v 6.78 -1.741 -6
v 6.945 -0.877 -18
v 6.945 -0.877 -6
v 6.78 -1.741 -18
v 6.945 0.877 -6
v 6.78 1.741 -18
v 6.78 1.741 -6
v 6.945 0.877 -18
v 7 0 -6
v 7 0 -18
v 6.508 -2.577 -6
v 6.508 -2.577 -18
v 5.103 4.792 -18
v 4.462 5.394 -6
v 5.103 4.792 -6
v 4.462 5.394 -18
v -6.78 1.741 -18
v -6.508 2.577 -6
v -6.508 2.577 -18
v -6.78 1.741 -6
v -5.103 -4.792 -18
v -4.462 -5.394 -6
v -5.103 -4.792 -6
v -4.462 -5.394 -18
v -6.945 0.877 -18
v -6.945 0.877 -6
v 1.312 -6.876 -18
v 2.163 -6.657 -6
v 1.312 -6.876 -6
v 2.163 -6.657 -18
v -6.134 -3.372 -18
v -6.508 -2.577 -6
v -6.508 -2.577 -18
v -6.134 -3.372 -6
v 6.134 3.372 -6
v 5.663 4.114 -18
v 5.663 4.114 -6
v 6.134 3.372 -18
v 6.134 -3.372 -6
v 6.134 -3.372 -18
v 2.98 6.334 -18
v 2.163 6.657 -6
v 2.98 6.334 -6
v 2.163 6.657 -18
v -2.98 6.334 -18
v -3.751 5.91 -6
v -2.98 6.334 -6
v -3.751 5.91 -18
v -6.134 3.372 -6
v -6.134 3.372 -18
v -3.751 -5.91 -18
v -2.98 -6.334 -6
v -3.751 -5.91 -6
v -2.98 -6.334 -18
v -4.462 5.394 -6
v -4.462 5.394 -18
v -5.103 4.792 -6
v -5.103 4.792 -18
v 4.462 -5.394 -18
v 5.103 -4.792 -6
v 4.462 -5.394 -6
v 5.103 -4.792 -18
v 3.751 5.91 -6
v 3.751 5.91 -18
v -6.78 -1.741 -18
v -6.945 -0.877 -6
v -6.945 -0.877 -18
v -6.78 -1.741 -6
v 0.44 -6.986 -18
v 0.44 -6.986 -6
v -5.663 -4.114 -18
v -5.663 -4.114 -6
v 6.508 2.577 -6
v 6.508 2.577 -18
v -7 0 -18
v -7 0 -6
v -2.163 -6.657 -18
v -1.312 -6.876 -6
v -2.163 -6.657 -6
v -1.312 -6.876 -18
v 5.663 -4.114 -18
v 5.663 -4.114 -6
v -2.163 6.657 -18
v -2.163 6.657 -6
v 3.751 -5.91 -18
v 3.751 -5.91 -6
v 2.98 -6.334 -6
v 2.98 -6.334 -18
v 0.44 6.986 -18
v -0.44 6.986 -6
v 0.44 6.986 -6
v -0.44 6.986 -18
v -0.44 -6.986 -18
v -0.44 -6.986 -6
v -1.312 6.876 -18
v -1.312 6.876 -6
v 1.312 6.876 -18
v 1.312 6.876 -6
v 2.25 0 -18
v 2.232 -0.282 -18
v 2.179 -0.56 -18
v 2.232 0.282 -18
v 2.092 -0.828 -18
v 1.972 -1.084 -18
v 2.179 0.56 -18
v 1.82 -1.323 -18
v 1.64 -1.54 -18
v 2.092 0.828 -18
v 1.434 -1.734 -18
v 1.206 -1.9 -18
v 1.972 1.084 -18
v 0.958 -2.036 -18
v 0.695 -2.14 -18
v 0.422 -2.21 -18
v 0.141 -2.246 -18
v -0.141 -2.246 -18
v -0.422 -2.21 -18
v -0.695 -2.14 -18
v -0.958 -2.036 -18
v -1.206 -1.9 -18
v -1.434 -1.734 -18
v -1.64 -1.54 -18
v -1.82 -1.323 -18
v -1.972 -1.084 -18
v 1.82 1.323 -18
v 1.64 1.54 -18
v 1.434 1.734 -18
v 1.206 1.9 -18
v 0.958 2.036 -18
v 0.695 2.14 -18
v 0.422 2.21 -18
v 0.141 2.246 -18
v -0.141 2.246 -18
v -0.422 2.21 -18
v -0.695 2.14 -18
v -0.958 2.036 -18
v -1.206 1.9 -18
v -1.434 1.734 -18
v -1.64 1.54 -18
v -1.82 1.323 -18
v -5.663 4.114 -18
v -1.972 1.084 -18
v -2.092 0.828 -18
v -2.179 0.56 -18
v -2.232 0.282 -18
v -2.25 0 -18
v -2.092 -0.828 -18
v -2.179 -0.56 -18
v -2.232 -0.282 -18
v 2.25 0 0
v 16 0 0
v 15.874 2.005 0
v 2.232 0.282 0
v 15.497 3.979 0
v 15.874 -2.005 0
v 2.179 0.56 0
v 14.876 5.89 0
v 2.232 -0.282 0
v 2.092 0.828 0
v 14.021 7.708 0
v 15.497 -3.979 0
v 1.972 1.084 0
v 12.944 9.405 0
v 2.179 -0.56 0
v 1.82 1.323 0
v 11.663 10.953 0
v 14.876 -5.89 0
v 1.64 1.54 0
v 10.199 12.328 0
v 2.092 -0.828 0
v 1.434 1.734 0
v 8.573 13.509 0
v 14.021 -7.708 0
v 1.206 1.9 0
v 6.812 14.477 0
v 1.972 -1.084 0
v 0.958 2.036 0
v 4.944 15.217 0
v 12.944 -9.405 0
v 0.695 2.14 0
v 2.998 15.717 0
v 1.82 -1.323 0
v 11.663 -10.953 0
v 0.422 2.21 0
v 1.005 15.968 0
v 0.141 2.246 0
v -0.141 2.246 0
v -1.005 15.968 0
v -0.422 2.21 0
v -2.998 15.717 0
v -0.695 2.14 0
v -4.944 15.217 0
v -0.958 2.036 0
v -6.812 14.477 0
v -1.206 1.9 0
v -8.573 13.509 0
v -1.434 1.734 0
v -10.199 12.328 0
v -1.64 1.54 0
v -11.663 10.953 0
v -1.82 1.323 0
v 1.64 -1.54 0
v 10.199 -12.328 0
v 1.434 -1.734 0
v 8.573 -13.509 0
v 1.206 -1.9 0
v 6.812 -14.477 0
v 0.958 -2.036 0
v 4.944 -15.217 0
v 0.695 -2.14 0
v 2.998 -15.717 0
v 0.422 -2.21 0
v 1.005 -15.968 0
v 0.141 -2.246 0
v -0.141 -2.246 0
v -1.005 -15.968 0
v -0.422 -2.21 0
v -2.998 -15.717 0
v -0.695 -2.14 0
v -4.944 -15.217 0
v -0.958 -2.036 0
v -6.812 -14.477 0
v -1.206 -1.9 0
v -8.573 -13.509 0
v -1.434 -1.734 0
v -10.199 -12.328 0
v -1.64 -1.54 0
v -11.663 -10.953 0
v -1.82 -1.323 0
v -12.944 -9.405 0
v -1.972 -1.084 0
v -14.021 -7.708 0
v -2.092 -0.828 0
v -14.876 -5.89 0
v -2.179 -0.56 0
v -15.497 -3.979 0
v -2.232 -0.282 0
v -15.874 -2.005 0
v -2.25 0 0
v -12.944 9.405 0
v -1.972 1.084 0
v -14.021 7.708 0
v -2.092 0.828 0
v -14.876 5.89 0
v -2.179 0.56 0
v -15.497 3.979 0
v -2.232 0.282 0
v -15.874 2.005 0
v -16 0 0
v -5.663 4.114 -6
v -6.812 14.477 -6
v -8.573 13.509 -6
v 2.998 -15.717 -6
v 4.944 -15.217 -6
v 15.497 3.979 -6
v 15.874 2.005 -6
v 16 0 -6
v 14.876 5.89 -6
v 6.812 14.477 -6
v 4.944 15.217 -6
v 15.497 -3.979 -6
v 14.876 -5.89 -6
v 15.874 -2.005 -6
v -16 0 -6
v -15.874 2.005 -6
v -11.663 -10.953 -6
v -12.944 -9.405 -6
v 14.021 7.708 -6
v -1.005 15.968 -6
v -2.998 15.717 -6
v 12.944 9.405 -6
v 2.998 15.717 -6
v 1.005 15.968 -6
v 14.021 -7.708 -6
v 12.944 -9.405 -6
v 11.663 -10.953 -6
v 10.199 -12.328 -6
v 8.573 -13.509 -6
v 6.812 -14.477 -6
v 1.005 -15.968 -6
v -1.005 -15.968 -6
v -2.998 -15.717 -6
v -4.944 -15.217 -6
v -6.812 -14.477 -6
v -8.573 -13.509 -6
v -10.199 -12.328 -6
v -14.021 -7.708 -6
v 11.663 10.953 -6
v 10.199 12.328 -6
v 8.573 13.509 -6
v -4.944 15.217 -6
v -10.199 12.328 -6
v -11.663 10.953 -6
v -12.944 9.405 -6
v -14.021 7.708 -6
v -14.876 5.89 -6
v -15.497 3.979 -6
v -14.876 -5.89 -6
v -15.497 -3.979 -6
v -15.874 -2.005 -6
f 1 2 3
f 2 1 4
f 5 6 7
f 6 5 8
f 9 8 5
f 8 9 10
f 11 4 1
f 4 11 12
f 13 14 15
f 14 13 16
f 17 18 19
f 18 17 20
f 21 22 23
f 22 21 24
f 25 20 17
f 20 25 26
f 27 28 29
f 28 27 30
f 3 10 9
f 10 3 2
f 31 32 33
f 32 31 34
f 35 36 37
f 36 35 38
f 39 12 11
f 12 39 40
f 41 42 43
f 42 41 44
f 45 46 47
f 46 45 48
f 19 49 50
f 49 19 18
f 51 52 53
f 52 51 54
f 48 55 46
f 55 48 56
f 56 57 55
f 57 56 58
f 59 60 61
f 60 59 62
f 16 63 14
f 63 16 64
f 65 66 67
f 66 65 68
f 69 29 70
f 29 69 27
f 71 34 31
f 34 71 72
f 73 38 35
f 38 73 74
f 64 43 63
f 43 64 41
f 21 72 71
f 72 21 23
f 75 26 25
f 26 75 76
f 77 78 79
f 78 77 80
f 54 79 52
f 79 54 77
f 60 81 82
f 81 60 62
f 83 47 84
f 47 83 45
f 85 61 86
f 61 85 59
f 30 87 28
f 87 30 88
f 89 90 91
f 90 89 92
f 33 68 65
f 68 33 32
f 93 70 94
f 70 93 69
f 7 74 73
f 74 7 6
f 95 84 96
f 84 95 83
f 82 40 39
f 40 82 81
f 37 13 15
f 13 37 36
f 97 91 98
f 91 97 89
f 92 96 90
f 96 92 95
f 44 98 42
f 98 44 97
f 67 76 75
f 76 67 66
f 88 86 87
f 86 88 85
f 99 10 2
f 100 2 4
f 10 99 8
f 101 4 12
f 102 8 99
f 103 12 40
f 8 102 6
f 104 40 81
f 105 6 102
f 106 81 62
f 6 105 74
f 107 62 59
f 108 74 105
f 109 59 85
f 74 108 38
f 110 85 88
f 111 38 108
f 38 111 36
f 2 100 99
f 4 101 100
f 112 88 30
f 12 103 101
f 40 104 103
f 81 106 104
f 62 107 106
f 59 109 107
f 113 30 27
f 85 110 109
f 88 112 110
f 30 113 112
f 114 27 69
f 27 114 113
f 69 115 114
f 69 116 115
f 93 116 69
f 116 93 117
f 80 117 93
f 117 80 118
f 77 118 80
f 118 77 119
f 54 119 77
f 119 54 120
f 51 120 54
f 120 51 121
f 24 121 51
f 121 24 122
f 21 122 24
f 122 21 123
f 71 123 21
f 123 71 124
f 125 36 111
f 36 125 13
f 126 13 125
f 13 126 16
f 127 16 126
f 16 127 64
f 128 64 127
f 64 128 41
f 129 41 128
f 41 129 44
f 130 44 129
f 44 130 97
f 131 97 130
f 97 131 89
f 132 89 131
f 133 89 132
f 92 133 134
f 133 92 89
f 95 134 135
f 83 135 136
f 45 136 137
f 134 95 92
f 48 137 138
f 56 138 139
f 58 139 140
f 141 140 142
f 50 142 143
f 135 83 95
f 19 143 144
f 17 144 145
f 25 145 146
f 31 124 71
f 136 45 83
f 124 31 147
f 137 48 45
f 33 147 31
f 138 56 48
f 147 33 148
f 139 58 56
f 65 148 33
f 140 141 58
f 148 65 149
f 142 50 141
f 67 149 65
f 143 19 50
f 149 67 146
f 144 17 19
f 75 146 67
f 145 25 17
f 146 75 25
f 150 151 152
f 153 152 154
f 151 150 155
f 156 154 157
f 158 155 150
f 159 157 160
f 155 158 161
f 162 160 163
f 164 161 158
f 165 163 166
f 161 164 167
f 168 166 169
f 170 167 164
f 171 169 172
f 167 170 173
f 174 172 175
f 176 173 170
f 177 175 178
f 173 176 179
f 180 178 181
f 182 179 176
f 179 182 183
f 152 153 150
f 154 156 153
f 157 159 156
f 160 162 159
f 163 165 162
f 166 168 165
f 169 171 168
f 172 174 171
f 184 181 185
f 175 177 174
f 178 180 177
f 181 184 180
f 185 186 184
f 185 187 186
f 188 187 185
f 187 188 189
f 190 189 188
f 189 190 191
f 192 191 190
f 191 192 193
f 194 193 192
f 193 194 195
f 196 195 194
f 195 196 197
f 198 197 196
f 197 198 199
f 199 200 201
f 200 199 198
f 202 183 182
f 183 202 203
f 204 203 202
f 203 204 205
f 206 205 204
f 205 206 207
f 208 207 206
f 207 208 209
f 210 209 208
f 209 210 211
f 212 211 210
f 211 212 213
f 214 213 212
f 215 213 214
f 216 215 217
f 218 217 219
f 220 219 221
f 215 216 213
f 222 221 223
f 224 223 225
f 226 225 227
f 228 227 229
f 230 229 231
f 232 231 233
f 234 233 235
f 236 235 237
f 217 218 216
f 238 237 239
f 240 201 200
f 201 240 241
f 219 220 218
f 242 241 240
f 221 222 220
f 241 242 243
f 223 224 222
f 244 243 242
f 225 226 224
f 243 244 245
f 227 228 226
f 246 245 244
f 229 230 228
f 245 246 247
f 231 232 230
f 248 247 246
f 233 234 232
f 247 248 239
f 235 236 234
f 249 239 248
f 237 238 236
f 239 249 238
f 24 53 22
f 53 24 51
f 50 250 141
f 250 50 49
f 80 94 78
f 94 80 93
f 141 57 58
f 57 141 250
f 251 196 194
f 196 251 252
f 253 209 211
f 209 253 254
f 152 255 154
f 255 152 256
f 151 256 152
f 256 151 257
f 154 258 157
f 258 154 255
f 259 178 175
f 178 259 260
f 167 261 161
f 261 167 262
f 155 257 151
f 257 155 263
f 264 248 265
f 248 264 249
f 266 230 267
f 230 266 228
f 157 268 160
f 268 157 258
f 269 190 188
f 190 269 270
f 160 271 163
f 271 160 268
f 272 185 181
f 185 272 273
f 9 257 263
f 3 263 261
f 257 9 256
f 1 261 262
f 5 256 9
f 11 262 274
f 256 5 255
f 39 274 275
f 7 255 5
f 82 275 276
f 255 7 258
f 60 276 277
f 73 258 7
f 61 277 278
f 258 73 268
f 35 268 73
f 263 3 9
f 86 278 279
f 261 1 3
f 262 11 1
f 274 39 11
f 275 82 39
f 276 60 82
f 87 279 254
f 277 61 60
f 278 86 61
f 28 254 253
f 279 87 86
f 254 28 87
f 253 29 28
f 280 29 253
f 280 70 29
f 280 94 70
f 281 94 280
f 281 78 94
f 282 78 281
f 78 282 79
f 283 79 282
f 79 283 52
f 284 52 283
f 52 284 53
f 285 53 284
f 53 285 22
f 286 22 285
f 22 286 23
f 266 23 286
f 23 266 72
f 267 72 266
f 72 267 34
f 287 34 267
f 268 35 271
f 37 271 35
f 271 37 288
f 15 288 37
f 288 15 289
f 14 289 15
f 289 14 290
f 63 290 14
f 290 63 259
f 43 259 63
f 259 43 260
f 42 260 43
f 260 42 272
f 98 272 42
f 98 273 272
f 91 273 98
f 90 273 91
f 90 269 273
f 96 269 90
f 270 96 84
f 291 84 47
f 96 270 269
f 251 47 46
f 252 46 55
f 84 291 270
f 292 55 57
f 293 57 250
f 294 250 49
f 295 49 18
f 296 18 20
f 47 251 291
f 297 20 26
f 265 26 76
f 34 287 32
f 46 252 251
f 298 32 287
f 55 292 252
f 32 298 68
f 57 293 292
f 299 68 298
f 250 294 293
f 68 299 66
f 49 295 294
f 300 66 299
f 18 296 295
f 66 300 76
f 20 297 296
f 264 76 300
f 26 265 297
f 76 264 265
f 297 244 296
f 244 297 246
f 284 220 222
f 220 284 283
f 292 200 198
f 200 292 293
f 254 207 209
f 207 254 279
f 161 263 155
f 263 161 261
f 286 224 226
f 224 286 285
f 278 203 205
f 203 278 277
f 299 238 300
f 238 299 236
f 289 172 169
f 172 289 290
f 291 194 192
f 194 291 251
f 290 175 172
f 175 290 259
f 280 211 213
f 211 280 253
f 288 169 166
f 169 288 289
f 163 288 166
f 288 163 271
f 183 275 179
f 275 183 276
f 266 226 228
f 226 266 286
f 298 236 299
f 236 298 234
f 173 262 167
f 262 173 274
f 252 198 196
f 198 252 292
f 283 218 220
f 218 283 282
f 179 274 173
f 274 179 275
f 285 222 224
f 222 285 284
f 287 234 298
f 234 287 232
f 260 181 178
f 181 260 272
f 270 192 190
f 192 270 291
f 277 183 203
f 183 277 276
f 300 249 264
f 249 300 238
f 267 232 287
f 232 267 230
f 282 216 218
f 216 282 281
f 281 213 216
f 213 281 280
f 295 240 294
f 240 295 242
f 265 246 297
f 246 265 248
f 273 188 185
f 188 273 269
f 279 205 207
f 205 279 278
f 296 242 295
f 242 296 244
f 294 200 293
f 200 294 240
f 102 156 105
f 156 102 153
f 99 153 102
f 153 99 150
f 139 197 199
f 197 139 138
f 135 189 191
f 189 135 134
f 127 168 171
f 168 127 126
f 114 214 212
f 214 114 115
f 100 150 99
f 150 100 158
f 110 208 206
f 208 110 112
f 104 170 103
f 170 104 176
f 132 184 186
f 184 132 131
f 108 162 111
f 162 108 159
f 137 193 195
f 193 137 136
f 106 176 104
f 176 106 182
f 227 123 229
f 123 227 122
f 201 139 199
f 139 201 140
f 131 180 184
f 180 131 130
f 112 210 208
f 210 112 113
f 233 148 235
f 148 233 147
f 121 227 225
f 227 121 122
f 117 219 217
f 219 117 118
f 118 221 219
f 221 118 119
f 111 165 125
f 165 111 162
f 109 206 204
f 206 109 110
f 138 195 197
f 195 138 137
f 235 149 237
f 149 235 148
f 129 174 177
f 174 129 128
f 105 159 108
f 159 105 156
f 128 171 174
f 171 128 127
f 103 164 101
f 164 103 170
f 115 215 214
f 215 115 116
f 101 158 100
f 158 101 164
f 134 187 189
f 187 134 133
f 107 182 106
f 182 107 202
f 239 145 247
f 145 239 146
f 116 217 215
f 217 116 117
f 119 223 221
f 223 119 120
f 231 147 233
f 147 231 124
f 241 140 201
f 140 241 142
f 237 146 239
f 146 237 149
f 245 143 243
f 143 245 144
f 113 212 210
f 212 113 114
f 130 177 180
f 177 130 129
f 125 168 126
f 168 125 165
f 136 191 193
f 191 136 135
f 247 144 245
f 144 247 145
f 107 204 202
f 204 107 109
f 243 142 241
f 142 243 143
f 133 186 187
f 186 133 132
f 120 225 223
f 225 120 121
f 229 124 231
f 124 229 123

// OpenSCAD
$fn = 50;


difference() {
	union() {
		translate(v = [0, 0, -18.0000000000]) {
			cylinder(h = 18, r = 7.0000000000);
		}
		translate(v = [0, 0, -6.0000000000]) {
			cylinder(h = 6, r = 16.0000000000);
		}
	}
	union() {
		#translate(v = [0, 0, -18]) {
			cylinder(h = 18, r = 2.2500000000);
		}
	}
}
